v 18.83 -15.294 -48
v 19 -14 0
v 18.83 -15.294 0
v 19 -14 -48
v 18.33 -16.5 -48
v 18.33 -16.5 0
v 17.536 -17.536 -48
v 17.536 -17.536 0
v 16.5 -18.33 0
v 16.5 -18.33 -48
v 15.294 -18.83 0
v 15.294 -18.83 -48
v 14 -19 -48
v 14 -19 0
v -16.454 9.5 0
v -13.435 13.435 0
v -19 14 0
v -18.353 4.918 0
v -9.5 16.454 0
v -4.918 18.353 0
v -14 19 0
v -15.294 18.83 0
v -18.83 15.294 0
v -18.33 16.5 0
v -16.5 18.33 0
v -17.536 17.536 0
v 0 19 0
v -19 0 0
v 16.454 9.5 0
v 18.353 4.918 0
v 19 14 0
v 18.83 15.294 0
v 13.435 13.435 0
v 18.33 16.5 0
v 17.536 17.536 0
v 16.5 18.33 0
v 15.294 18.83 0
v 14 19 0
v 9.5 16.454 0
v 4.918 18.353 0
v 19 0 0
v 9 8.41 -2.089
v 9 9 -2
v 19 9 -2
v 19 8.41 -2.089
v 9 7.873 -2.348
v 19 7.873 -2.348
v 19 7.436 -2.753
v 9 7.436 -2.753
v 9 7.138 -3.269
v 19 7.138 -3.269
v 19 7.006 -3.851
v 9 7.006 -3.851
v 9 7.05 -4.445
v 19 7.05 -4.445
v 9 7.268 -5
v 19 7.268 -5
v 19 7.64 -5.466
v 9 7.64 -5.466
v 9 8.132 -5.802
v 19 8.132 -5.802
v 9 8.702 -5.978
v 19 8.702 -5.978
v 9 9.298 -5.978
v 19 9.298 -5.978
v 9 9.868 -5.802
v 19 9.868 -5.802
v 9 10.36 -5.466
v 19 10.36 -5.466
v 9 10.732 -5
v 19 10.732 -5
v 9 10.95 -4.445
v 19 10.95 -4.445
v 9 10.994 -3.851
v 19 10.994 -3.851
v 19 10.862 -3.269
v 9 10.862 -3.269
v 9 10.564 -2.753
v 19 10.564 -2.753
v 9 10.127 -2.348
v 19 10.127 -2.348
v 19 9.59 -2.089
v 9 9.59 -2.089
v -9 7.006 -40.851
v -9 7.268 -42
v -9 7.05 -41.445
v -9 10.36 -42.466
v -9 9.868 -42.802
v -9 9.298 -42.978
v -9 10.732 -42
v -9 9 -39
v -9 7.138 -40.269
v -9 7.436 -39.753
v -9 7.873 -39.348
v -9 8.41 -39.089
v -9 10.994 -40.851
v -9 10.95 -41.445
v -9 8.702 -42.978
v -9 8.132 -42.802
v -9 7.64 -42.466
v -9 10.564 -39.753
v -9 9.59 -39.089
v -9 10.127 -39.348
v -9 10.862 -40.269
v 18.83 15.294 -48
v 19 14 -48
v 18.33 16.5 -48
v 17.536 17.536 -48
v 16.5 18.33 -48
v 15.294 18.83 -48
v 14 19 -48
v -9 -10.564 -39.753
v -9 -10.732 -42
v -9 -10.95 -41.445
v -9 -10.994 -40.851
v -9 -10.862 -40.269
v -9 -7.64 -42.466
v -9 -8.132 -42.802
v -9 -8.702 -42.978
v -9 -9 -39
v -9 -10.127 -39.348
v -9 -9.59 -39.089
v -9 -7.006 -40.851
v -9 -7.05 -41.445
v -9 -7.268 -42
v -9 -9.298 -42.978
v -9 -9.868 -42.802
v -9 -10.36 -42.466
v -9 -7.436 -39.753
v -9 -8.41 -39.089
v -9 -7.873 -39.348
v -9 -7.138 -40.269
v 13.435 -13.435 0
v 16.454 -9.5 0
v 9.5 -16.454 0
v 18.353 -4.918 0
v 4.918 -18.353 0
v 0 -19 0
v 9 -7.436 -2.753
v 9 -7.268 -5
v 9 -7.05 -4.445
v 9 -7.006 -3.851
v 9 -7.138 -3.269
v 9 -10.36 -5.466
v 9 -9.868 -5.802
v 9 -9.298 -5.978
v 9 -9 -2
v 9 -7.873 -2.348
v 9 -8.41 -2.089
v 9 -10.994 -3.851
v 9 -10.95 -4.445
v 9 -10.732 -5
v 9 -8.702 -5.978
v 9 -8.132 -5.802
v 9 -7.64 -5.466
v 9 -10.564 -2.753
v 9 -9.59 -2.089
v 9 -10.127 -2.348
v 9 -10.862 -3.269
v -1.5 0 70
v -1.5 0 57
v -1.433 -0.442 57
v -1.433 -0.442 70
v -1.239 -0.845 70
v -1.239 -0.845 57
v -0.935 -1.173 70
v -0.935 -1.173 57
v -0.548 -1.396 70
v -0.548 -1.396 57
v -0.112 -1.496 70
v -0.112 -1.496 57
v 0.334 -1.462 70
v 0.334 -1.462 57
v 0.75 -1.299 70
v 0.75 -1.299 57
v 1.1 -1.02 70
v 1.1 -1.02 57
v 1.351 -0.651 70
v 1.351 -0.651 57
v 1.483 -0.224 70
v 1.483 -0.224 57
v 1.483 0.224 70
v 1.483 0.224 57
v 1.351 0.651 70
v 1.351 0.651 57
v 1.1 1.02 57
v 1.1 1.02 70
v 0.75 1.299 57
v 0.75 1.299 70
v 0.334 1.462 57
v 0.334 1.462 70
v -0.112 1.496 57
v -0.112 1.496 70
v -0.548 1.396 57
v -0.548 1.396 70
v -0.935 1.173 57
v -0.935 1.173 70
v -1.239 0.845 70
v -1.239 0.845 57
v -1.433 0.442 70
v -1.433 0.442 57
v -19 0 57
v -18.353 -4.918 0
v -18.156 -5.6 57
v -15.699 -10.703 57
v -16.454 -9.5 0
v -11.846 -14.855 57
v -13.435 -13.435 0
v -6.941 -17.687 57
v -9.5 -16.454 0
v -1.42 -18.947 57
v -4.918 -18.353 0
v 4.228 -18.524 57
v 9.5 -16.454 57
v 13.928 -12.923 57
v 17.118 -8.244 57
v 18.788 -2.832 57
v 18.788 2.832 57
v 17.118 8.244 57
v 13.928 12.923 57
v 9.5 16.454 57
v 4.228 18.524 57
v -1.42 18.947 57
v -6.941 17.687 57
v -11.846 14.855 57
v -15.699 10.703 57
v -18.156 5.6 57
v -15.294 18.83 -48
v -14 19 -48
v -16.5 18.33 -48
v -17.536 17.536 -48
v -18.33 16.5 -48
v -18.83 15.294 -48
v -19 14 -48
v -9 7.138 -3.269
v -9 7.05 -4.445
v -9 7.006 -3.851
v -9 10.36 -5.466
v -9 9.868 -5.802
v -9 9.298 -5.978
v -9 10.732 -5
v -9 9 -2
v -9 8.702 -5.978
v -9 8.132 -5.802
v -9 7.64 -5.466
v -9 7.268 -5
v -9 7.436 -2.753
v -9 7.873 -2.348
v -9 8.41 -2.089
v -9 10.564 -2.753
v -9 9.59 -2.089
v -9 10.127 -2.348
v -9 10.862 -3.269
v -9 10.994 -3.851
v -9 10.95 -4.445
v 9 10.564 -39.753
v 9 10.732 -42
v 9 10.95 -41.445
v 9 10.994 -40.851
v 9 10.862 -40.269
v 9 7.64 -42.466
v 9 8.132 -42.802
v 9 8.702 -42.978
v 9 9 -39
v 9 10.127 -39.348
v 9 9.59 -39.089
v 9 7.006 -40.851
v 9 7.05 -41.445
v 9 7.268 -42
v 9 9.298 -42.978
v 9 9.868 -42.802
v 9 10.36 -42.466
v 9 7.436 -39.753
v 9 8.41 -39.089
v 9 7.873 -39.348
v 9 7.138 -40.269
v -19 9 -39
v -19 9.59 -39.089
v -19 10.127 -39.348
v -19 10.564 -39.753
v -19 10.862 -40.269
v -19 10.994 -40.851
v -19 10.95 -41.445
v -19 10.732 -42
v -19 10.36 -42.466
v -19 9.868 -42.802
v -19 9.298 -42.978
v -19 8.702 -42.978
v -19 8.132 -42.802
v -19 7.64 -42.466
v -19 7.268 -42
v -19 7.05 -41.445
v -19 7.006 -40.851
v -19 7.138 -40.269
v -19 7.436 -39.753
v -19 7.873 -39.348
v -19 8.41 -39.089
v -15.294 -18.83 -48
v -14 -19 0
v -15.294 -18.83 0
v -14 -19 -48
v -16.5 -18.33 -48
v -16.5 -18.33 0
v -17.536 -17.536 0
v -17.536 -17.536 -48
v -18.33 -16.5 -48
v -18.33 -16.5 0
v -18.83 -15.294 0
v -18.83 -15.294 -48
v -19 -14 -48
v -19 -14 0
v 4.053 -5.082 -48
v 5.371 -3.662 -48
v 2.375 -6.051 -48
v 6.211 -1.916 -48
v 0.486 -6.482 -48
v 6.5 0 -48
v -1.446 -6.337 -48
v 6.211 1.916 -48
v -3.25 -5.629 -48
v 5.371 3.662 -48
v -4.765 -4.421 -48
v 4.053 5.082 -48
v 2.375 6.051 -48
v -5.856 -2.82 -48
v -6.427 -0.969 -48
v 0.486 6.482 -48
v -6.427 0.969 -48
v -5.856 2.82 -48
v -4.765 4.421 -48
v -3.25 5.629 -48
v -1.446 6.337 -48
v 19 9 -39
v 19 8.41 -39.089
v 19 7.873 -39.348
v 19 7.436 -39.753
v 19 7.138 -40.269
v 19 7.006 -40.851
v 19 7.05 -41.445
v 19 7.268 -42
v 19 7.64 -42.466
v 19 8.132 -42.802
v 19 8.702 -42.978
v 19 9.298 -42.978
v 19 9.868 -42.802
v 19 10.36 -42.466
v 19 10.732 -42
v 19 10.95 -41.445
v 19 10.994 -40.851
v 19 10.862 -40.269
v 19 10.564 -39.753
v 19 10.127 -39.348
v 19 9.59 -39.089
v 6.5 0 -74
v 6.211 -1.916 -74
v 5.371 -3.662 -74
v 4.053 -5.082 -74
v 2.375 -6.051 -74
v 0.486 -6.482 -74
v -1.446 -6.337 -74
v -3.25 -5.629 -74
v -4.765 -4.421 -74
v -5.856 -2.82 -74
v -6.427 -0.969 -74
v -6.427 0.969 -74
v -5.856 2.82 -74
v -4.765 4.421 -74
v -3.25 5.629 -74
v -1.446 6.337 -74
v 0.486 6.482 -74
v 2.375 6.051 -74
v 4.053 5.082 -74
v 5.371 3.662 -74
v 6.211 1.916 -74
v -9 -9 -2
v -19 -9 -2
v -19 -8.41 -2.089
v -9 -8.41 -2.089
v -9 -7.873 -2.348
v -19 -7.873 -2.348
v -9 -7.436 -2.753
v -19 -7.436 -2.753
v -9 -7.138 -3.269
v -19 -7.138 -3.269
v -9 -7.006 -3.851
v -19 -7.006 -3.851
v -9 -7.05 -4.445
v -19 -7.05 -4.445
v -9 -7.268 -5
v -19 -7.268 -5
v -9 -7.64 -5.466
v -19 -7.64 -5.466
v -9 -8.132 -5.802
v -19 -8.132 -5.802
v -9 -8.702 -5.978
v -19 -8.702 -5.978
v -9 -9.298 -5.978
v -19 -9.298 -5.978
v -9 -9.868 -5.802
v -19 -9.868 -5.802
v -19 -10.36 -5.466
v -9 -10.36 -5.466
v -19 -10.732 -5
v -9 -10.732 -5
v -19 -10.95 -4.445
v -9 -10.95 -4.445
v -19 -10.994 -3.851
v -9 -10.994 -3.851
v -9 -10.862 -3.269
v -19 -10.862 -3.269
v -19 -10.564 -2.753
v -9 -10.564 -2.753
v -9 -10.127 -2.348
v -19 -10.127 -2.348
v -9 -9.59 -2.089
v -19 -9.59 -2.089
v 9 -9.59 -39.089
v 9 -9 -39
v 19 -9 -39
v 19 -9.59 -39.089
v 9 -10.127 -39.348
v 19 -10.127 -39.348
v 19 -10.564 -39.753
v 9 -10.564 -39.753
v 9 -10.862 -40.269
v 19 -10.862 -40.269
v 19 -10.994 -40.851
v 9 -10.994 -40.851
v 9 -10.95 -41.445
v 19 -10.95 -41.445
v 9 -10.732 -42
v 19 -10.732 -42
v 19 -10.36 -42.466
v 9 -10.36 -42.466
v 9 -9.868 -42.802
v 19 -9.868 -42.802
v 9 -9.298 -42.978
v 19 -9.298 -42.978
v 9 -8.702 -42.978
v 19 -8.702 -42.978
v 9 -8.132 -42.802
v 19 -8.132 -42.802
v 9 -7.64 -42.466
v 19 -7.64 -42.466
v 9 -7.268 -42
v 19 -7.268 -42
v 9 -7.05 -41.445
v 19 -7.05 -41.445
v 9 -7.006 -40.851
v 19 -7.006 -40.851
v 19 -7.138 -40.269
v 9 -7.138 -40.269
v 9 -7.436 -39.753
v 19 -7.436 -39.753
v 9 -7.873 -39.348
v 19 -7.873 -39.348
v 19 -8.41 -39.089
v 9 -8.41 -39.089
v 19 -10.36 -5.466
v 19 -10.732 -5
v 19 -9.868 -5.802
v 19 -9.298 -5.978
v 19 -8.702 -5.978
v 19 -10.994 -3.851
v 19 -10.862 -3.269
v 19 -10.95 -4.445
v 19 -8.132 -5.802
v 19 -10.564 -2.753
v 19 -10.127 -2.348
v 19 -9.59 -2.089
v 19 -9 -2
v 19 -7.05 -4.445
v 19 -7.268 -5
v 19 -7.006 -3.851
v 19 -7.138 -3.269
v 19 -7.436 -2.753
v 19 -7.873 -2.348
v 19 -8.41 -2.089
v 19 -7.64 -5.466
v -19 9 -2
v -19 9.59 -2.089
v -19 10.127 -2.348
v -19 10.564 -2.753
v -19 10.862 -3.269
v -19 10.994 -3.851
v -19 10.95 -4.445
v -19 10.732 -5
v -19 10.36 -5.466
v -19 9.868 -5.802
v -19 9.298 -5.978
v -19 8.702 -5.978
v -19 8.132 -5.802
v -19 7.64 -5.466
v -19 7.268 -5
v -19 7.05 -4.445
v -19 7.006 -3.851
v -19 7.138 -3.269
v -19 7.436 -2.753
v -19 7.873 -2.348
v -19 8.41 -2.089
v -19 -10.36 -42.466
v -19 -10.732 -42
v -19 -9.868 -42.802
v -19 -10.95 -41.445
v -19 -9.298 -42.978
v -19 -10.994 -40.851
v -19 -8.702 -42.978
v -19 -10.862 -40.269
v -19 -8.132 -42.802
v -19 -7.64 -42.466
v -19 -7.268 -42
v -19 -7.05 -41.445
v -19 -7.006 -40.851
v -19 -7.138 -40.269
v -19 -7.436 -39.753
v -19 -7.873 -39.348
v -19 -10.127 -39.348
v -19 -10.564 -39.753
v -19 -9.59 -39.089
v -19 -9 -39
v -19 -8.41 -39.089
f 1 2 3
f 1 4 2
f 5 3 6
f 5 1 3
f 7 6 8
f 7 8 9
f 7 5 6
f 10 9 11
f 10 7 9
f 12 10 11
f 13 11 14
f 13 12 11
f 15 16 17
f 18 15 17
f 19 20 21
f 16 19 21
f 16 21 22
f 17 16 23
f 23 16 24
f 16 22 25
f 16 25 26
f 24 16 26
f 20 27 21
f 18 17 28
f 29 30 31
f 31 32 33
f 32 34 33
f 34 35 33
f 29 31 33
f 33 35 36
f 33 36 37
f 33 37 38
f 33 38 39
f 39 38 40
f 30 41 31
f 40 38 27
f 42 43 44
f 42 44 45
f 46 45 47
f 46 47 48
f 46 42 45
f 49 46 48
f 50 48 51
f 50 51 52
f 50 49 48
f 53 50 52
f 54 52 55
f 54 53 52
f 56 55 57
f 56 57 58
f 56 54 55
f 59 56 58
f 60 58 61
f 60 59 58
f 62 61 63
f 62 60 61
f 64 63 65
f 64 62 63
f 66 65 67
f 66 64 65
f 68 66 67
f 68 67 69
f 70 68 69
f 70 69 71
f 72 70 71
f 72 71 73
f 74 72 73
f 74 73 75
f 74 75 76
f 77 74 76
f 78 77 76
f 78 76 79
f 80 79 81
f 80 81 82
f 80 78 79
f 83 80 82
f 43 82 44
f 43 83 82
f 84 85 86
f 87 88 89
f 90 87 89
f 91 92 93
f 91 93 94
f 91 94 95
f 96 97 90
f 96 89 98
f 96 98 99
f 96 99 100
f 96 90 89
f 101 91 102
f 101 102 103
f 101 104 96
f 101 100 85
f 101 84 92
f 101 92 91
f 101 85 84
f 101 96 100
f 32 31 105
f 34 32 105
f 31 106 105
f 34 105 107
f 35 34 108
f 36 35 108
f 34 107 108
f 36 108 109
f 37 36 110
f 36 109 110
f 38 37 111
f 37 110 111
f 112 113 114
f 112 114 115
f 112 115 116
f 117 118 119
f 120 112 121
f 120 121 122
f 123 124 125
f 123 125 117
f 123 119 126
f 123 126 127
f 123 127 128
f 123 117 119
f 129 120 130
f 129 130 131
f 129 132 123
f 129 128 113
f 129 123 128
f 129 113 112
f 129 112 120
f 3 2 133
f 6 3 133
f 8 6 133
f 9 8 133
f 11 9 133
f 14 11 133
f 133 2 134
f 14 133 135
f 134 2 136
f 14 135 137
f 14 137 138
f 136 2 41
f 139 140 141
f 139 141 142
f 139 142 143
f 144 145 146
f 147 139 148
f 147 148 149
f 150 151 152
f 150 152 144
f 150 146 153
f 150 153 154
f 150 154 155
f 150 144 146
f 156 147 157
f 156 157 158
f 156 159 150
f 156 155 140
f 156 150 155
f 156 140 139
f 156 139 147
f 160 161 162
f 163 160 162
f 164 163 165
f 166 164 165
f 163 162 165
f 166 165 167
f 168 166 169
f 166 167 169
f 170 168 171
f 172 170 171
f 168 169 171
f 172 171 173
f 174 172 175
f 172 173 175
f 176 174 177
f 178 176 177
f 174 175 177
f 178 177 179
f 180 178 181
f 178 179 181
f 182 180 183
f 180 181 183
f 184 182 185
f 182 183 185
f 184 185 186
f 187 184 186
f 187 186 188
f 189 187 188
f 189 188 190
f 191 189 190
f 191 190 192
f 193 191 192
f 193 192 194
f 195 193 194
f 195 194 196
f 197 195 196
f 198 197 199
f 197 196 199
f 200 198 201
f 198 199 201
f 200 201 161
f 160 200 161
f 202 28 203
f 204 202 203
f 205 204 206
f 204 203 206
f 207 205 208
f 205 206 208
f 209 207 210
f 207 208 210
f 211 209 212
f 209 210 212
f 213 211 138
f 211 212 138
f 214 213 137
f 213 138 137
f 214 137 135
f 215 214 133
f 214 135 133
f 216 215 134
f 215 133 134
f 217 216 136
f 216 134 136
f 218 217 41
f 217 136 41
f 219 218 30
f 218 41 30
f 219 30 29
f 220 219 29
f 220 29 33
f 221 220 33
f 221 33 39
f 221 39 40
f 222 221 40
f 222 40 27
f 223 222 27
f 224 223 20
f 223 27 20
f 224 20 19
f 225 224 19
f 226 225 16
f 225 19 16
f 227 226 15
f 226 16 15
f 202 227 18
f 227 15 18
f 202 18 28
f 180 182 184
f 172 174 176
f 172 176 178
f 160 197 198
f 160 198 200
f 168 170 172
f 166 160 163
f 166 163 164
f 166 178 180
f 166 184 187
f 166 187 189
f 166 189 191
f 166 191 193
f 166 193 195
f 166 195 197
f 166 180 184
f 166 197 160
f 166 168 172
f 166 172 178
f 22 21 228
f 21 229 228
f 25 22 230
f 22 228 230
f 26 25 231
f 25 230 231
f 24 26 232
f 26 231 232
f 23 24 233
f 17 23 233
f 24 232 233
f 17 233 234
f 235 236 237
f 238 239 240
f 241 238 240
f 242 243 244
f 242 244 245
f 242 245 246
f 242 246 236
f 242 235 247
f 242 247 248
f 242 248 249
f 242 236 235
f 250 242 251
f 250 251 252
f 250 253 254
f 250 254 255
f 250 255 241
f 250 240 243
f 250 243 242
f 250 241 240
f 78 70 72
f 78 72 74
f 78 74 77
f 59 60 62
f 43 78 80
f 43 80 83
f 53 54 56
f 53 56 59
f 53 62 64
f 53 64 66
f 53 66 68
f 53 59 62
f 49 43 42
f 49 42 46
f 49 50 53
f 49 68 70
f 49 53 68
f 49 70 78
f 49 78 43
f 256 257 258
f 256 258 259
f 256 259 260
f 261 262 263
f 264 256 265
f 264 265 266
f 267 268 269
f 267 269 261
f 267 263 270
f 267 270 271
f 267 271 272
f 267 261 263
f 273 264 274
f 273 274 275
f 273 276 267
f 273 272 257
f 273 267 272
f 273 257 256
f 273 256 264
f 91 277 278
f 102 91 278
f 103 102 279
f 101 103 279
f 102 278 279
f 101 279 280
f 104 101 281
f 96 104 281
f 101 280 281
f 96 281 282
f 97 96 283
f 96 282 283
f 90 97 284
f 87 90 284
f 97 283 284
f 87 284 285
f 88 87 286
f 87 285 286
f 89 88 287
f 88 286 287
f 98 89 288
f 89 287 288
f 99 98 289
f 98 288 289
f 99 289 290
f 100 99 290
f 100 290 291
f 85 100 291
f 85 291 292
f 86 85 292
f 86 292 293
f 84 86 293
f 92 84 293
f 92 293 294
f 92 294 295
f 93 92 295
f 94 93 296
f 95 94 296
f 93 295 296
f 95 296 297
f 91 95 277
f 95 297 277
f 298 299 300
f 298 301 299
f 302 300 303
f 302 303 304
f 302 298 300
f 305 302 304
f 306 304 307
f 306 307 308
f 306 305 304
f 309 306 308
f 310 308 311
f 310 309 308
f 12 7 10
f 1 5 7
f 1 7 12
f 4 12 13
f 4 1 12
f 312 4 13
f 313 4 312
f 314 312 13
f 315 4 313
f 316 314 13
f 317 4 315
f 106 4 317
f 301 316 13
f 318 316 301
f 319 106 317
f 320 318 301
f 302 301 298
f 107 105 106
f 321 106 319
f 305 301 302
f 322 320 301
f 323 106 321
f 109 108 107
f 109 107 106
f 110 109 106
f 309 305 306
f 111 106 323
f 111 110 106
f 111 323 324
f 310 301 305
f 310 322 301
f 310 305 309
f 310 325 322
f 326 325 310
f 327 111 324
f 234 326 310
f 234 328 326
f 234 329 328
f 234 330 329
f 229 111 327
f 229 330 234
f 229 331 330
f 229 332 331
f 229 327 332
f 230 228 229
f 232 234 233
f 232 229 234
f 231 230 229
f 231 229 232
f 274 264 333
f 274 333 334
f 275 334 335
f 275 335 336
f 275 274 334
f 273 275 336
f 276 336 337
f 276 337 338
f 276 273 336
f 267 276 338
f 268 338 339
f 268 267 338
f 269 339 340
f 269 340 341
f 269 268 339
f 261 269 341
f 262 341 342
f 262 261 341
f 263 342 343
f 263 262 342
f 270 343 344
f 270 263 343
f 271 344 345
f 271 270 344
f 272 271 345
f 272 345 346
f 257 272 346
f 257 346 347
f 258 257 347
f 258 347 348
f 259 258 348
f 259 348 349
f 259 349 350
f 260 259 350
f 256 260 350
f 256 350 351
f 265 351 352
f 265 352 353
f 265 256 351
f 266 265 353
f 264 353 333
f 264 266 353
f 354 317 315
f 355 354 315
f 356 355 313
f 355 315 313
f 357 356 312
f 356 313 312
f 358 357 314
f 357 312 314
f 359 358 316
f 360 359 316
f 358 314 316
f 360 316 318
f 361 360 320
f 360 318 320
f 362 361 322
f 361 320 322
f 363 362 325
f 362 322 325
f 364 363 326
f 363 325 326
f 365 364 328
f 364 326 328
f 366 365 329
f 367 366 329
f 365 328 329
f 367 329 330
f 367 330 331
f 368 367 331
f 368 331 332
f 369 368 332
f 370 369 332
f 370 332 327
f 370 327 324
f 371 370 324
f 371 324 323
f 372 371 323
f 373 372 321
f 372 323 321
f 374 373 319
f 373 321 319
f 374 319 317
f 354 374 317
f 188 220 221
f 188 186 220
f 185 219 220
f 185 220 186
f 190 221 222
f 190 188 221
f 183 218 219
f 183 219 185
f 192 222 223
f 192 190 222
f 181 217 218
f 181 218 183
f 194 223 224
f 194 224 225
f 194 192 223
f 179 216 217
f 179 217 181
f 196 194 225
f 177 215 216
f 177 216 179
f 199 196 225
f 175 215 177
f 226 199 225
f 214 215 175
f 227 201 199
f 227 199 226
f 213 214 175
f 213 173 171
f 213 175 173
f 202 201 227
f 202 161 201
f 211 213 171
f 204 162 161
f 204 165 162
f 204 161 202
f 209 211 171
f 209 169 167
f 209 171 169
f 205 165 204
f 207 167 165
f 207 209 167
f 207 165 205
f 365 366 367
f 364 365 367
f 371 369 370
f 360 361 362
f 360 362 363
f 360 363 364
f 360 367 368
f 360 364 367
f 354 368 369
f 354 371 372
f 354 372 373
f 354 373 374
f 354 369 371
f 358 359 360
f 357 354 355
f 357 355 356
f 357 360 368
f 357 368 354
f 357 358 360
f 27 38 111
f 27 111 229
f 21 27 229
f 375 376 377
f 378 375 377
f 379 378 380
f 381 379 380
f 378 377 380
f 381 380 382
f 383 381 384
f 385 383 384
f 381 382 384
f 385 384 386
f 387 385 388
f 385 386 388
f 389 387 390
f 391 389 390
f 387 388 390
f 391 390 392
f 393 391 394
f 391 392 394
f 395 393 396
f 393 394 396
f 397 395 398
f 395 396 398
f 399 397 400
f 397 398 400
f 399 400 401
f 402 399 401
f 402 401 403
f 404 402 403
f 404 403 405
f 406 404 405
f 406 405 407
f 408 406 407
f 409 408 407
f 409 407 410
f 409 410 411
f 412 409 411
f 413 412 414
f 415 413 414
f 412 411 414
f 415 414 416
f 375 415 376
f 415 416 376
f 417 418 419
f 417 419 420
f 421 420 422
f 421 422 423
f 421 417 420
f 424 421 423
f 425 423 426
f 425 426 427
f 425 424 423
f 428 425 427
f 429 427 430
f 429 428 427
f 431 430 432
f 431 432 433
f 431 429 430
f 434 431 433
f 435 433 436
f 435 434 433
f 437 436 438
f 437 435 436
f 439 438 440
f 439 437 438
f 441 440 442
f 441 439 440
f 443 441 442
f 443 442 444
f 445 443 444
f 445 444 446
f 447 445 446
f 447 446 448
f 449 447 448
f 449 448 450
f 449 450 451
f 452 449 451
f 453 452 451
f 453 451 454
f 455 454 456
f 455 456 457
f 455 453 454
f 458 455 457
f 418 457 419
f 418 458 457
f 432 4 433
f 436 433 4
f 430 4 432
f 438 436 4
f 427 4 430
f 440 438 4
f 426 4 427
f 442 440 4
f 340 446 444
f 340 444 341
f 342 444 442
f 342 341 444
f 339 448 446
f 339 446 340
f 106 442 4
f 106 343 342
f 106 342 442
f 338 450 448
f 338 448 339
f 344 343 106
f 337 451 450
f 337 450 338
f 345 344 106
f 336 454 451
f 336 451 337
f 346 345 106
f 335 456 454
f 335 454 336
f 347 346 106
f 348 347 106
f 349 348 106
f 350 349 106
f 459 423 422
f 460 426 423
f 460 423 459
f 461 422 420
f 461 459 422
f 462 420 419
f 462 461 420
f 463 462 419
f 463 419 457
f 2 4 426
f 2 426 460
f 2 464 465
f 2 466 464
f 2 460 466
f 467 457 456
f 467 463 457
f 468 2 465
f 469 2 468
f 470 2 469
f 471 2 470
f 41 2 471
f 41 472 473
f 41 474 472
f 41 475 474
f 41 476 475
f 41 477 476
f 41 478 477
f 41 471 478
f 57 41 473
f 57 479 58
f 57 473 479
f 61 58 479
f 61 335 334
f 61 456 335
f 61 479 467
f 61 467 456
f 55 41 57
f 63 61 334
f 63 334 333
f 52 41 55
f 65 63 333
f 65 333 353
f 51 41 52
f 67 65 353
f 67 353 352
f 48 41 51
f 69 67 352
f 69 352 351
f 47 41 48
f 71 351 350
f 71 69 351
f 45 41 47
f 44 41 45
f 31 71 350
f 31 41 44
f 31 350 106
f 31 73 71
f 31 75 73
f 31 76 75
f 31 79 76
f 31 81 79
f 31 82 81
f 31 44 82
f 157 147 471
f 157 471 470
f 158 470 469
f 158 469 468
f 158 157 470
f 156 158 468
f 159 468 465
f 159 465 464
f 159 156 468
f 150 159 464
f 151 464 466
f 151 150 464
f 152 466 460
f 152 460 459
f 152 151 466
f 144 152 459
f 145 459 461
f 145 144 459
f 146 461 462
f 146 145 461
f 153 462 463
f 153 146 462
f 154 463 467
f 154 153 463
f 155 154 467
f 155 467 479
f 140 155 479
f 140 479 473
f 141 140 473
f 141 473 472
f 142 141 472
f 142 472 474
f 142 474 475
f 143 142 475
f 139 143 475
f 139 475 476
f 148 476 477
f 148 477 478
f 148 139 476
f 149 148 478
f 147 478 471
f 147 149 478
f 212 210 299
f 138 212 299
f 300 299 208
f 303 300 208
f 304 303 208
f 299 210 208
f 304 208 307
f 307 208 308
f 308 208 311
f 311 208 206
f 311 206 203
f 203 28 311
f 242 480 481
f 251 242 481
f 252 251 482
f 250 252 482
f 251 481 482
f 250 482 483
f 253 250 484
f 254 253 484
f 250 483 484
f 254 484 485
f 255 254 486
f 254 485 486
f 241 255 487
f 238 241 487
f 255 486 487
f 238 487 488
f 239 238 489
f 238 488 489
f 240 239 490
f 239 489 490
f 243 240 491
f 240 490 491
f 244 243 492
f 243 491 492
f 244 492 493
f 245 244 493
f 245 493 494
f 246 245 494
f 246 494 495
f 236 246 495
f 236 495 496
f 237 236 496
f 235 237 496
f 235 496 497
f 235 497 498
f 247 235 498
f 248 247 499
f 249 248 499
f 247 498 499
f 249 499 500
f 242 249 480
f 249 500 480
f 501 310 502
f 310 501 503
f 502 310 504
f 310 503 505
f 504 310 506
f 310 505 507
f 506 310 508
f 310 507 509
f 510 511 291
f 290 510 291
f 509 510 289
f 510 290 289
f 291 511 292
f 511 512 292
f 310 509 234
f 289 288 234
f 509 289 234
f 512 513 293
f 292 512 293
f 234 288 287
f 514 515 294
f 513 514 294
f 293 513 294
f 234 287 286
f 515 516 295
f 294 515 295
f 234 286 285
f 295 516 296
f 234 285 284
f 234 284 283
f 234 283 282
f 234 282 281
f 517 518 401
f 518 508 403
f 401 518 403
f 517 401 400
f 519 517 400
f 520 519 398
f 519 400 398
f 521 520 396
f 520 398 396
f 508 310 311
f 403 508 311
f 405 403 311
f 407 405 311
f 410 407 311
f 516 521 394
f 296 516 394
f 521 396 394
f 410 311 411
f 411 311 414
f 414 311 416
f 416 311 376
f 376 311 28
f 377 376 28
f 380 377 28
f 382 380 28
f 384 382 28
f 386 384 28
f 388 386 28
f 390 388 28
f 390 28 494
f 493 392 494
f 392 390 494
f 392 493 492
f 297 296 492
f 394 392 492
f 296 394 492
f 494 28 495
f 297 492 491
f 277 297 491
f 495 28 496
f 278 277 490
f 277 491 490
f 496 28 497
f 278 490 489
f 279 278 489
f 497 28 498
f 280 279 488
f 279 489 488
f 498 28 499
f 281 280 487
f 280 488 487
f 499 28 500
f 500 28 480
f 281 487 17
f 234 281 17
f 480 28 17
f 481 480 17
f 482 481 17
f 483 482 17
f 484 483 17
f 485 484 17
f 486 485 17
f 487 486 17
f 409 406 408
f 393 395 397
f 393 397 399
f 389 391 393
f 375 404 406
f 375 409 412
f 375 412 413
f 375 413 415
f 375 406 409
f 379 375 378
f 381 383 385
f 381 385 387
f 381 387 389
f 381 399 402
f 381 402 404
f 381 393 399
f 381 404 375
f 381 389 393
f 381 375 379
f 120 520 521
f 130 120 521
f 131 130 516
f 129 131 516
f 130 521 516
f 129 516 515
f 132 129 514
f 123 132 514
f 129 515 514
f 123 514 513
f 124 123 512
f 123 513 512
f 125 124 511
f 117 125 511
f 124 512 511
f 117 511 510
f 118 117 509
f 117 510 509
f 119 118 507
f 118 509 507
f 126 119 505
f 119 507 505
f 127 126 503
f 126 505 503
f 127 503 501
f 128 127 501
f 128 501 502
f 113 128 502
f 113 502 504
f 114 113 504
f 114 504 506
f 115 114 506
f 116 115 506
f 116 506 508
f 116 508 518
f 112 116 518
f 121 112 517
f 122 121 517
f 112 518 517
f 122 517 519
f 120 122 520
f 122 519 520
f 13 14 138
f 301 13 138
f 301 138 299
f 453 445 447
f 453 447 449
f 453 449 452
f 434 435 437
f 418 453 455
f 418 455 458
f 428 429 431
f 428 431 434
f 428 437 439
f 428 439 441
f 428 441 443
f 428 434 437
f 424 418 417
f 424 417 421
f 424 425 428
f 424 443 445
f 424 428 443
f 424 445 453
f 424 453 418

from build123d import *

# Parameters (mm, degrees)
SKETCH1_R           = 19
BOSS_EXTRUDE1_DEPTH = 57
SKETCH3_W           = 38
SKETCH3_H           = 38
BOSS_EXTRUDE3_DEPTH = 48
SKETCH4_R           = 6.5
BOSS_EXTRUDE4_DEPTH = 26
SKETCH5_R           = 1.5
BOSS_EXTRUDE5_DEPTH = 13
FILLET1_R           = 5
SKETCH6_R           = 2
CUT_EXTRUDE1_DEPTH  = 10
CUT_EXTRUDE2_START  = -10
SKETCH7_R           = 2
CUT_EXTRUDE2_DEPTH  = 10


with BuildPart() as part:
    # Sketch1 → Boss-Extrude1 (new body)
    with BuildSketch(Plane.XY):
        with Locations(Location((0, 0, 0), (0, 0, 180))):
            Circle(SKETCH1_R)
    extrude(amount=BOSS_EXTRUDE1_DEPTH)

    # Sketch3 → Boss-Extrude3 (add)
    with BuildSketch(Plane(origin=(0, 0, 0), x_dir=(-1, 0, 0), z_dir=(0, 0, -1))):
        Rectangle(SKETCH3_W, SKETCH3_H)
    extrude(amount=BOSS_EXTRUDE3_DEPTH)

    # Sketch4 → Boss-Extrude4 (add)
    with BuildSketch(Plane(origin=(0, 0, -48), x_dir=(-1, 0, 0), z_dir=(0, 0, -1))):
        with Locations(Location((0, 0, 0), (0, 0, 180))):
            Circle(SKETCH4_R)
    extrude(amount=BOSS_EXTRUDE4_DEPTH)

    # Sketch5 → Boss-Extrude5 (add)
    with BuildSketch(Plane.XY.offset(57)):
        with Locations(Location((0, 0, 0), (0, 0, 180))):
            Circle(SKETCH5_R)
    extrude(amount=BOSS_EXTRUDE5_DEPTH)

    # Fillet1
    fillet1_edges = [part.edges().sort_by_distance(p)[0] for p in [
        (-19, -19, -24),
        (-19, 19, -24),
        (19, 19, -24),
        (19, -19, -24),
    ]]
    fillet(fillet1_edges, radius=FILLET1_R)

    # Sketch6 → Cut-Extrude1 (cut)
    with BuildSketch(Plane.ZY.offset(19)):
        with Locations((-4, 9)):
            Circle(SKETCH6_R)
        with Locations((-4, -9)):
            Circle(SKETCH6_R)
        with Locations((-41, -9)):
            Circle(SKETCH6_R)
        with Locations((-41, 9)):
            Circle(SKETCH6_R)
    extrude(amount=-CUT_EXTRUDE1_DEPTH, mode=Mode.SUBTRACT)

    # Sketch7 → Cut-Extrude2 (cut)
    with BuildSketch(Plane(origin=(19, 0, 0), x_dir=(0, 0, -1), z_dir=(1, 0, 0)).offset(CUT_EXTRUDE2_START)):
        with Locations(Location((41, 9, 0), (0, 0, 180))):
            Circle(SKETCH7_R)
        with Locations(Location((41, -9, 0), (0, 0, 180))):
            Circle(SKETCH7_R)
        with Locations(Location((4, -9, 0), (0, 0, 180))):
            Circle(SKETCH7_R)
        with Locations(Location((4, 9, 0), (0, 0, 180))):
            Circle(SKETCH7_R)
    extrude(amount=CUT_EXTRUDE2_DEPTH, mode=Mode.SUBTRACT)


solid = part.part
